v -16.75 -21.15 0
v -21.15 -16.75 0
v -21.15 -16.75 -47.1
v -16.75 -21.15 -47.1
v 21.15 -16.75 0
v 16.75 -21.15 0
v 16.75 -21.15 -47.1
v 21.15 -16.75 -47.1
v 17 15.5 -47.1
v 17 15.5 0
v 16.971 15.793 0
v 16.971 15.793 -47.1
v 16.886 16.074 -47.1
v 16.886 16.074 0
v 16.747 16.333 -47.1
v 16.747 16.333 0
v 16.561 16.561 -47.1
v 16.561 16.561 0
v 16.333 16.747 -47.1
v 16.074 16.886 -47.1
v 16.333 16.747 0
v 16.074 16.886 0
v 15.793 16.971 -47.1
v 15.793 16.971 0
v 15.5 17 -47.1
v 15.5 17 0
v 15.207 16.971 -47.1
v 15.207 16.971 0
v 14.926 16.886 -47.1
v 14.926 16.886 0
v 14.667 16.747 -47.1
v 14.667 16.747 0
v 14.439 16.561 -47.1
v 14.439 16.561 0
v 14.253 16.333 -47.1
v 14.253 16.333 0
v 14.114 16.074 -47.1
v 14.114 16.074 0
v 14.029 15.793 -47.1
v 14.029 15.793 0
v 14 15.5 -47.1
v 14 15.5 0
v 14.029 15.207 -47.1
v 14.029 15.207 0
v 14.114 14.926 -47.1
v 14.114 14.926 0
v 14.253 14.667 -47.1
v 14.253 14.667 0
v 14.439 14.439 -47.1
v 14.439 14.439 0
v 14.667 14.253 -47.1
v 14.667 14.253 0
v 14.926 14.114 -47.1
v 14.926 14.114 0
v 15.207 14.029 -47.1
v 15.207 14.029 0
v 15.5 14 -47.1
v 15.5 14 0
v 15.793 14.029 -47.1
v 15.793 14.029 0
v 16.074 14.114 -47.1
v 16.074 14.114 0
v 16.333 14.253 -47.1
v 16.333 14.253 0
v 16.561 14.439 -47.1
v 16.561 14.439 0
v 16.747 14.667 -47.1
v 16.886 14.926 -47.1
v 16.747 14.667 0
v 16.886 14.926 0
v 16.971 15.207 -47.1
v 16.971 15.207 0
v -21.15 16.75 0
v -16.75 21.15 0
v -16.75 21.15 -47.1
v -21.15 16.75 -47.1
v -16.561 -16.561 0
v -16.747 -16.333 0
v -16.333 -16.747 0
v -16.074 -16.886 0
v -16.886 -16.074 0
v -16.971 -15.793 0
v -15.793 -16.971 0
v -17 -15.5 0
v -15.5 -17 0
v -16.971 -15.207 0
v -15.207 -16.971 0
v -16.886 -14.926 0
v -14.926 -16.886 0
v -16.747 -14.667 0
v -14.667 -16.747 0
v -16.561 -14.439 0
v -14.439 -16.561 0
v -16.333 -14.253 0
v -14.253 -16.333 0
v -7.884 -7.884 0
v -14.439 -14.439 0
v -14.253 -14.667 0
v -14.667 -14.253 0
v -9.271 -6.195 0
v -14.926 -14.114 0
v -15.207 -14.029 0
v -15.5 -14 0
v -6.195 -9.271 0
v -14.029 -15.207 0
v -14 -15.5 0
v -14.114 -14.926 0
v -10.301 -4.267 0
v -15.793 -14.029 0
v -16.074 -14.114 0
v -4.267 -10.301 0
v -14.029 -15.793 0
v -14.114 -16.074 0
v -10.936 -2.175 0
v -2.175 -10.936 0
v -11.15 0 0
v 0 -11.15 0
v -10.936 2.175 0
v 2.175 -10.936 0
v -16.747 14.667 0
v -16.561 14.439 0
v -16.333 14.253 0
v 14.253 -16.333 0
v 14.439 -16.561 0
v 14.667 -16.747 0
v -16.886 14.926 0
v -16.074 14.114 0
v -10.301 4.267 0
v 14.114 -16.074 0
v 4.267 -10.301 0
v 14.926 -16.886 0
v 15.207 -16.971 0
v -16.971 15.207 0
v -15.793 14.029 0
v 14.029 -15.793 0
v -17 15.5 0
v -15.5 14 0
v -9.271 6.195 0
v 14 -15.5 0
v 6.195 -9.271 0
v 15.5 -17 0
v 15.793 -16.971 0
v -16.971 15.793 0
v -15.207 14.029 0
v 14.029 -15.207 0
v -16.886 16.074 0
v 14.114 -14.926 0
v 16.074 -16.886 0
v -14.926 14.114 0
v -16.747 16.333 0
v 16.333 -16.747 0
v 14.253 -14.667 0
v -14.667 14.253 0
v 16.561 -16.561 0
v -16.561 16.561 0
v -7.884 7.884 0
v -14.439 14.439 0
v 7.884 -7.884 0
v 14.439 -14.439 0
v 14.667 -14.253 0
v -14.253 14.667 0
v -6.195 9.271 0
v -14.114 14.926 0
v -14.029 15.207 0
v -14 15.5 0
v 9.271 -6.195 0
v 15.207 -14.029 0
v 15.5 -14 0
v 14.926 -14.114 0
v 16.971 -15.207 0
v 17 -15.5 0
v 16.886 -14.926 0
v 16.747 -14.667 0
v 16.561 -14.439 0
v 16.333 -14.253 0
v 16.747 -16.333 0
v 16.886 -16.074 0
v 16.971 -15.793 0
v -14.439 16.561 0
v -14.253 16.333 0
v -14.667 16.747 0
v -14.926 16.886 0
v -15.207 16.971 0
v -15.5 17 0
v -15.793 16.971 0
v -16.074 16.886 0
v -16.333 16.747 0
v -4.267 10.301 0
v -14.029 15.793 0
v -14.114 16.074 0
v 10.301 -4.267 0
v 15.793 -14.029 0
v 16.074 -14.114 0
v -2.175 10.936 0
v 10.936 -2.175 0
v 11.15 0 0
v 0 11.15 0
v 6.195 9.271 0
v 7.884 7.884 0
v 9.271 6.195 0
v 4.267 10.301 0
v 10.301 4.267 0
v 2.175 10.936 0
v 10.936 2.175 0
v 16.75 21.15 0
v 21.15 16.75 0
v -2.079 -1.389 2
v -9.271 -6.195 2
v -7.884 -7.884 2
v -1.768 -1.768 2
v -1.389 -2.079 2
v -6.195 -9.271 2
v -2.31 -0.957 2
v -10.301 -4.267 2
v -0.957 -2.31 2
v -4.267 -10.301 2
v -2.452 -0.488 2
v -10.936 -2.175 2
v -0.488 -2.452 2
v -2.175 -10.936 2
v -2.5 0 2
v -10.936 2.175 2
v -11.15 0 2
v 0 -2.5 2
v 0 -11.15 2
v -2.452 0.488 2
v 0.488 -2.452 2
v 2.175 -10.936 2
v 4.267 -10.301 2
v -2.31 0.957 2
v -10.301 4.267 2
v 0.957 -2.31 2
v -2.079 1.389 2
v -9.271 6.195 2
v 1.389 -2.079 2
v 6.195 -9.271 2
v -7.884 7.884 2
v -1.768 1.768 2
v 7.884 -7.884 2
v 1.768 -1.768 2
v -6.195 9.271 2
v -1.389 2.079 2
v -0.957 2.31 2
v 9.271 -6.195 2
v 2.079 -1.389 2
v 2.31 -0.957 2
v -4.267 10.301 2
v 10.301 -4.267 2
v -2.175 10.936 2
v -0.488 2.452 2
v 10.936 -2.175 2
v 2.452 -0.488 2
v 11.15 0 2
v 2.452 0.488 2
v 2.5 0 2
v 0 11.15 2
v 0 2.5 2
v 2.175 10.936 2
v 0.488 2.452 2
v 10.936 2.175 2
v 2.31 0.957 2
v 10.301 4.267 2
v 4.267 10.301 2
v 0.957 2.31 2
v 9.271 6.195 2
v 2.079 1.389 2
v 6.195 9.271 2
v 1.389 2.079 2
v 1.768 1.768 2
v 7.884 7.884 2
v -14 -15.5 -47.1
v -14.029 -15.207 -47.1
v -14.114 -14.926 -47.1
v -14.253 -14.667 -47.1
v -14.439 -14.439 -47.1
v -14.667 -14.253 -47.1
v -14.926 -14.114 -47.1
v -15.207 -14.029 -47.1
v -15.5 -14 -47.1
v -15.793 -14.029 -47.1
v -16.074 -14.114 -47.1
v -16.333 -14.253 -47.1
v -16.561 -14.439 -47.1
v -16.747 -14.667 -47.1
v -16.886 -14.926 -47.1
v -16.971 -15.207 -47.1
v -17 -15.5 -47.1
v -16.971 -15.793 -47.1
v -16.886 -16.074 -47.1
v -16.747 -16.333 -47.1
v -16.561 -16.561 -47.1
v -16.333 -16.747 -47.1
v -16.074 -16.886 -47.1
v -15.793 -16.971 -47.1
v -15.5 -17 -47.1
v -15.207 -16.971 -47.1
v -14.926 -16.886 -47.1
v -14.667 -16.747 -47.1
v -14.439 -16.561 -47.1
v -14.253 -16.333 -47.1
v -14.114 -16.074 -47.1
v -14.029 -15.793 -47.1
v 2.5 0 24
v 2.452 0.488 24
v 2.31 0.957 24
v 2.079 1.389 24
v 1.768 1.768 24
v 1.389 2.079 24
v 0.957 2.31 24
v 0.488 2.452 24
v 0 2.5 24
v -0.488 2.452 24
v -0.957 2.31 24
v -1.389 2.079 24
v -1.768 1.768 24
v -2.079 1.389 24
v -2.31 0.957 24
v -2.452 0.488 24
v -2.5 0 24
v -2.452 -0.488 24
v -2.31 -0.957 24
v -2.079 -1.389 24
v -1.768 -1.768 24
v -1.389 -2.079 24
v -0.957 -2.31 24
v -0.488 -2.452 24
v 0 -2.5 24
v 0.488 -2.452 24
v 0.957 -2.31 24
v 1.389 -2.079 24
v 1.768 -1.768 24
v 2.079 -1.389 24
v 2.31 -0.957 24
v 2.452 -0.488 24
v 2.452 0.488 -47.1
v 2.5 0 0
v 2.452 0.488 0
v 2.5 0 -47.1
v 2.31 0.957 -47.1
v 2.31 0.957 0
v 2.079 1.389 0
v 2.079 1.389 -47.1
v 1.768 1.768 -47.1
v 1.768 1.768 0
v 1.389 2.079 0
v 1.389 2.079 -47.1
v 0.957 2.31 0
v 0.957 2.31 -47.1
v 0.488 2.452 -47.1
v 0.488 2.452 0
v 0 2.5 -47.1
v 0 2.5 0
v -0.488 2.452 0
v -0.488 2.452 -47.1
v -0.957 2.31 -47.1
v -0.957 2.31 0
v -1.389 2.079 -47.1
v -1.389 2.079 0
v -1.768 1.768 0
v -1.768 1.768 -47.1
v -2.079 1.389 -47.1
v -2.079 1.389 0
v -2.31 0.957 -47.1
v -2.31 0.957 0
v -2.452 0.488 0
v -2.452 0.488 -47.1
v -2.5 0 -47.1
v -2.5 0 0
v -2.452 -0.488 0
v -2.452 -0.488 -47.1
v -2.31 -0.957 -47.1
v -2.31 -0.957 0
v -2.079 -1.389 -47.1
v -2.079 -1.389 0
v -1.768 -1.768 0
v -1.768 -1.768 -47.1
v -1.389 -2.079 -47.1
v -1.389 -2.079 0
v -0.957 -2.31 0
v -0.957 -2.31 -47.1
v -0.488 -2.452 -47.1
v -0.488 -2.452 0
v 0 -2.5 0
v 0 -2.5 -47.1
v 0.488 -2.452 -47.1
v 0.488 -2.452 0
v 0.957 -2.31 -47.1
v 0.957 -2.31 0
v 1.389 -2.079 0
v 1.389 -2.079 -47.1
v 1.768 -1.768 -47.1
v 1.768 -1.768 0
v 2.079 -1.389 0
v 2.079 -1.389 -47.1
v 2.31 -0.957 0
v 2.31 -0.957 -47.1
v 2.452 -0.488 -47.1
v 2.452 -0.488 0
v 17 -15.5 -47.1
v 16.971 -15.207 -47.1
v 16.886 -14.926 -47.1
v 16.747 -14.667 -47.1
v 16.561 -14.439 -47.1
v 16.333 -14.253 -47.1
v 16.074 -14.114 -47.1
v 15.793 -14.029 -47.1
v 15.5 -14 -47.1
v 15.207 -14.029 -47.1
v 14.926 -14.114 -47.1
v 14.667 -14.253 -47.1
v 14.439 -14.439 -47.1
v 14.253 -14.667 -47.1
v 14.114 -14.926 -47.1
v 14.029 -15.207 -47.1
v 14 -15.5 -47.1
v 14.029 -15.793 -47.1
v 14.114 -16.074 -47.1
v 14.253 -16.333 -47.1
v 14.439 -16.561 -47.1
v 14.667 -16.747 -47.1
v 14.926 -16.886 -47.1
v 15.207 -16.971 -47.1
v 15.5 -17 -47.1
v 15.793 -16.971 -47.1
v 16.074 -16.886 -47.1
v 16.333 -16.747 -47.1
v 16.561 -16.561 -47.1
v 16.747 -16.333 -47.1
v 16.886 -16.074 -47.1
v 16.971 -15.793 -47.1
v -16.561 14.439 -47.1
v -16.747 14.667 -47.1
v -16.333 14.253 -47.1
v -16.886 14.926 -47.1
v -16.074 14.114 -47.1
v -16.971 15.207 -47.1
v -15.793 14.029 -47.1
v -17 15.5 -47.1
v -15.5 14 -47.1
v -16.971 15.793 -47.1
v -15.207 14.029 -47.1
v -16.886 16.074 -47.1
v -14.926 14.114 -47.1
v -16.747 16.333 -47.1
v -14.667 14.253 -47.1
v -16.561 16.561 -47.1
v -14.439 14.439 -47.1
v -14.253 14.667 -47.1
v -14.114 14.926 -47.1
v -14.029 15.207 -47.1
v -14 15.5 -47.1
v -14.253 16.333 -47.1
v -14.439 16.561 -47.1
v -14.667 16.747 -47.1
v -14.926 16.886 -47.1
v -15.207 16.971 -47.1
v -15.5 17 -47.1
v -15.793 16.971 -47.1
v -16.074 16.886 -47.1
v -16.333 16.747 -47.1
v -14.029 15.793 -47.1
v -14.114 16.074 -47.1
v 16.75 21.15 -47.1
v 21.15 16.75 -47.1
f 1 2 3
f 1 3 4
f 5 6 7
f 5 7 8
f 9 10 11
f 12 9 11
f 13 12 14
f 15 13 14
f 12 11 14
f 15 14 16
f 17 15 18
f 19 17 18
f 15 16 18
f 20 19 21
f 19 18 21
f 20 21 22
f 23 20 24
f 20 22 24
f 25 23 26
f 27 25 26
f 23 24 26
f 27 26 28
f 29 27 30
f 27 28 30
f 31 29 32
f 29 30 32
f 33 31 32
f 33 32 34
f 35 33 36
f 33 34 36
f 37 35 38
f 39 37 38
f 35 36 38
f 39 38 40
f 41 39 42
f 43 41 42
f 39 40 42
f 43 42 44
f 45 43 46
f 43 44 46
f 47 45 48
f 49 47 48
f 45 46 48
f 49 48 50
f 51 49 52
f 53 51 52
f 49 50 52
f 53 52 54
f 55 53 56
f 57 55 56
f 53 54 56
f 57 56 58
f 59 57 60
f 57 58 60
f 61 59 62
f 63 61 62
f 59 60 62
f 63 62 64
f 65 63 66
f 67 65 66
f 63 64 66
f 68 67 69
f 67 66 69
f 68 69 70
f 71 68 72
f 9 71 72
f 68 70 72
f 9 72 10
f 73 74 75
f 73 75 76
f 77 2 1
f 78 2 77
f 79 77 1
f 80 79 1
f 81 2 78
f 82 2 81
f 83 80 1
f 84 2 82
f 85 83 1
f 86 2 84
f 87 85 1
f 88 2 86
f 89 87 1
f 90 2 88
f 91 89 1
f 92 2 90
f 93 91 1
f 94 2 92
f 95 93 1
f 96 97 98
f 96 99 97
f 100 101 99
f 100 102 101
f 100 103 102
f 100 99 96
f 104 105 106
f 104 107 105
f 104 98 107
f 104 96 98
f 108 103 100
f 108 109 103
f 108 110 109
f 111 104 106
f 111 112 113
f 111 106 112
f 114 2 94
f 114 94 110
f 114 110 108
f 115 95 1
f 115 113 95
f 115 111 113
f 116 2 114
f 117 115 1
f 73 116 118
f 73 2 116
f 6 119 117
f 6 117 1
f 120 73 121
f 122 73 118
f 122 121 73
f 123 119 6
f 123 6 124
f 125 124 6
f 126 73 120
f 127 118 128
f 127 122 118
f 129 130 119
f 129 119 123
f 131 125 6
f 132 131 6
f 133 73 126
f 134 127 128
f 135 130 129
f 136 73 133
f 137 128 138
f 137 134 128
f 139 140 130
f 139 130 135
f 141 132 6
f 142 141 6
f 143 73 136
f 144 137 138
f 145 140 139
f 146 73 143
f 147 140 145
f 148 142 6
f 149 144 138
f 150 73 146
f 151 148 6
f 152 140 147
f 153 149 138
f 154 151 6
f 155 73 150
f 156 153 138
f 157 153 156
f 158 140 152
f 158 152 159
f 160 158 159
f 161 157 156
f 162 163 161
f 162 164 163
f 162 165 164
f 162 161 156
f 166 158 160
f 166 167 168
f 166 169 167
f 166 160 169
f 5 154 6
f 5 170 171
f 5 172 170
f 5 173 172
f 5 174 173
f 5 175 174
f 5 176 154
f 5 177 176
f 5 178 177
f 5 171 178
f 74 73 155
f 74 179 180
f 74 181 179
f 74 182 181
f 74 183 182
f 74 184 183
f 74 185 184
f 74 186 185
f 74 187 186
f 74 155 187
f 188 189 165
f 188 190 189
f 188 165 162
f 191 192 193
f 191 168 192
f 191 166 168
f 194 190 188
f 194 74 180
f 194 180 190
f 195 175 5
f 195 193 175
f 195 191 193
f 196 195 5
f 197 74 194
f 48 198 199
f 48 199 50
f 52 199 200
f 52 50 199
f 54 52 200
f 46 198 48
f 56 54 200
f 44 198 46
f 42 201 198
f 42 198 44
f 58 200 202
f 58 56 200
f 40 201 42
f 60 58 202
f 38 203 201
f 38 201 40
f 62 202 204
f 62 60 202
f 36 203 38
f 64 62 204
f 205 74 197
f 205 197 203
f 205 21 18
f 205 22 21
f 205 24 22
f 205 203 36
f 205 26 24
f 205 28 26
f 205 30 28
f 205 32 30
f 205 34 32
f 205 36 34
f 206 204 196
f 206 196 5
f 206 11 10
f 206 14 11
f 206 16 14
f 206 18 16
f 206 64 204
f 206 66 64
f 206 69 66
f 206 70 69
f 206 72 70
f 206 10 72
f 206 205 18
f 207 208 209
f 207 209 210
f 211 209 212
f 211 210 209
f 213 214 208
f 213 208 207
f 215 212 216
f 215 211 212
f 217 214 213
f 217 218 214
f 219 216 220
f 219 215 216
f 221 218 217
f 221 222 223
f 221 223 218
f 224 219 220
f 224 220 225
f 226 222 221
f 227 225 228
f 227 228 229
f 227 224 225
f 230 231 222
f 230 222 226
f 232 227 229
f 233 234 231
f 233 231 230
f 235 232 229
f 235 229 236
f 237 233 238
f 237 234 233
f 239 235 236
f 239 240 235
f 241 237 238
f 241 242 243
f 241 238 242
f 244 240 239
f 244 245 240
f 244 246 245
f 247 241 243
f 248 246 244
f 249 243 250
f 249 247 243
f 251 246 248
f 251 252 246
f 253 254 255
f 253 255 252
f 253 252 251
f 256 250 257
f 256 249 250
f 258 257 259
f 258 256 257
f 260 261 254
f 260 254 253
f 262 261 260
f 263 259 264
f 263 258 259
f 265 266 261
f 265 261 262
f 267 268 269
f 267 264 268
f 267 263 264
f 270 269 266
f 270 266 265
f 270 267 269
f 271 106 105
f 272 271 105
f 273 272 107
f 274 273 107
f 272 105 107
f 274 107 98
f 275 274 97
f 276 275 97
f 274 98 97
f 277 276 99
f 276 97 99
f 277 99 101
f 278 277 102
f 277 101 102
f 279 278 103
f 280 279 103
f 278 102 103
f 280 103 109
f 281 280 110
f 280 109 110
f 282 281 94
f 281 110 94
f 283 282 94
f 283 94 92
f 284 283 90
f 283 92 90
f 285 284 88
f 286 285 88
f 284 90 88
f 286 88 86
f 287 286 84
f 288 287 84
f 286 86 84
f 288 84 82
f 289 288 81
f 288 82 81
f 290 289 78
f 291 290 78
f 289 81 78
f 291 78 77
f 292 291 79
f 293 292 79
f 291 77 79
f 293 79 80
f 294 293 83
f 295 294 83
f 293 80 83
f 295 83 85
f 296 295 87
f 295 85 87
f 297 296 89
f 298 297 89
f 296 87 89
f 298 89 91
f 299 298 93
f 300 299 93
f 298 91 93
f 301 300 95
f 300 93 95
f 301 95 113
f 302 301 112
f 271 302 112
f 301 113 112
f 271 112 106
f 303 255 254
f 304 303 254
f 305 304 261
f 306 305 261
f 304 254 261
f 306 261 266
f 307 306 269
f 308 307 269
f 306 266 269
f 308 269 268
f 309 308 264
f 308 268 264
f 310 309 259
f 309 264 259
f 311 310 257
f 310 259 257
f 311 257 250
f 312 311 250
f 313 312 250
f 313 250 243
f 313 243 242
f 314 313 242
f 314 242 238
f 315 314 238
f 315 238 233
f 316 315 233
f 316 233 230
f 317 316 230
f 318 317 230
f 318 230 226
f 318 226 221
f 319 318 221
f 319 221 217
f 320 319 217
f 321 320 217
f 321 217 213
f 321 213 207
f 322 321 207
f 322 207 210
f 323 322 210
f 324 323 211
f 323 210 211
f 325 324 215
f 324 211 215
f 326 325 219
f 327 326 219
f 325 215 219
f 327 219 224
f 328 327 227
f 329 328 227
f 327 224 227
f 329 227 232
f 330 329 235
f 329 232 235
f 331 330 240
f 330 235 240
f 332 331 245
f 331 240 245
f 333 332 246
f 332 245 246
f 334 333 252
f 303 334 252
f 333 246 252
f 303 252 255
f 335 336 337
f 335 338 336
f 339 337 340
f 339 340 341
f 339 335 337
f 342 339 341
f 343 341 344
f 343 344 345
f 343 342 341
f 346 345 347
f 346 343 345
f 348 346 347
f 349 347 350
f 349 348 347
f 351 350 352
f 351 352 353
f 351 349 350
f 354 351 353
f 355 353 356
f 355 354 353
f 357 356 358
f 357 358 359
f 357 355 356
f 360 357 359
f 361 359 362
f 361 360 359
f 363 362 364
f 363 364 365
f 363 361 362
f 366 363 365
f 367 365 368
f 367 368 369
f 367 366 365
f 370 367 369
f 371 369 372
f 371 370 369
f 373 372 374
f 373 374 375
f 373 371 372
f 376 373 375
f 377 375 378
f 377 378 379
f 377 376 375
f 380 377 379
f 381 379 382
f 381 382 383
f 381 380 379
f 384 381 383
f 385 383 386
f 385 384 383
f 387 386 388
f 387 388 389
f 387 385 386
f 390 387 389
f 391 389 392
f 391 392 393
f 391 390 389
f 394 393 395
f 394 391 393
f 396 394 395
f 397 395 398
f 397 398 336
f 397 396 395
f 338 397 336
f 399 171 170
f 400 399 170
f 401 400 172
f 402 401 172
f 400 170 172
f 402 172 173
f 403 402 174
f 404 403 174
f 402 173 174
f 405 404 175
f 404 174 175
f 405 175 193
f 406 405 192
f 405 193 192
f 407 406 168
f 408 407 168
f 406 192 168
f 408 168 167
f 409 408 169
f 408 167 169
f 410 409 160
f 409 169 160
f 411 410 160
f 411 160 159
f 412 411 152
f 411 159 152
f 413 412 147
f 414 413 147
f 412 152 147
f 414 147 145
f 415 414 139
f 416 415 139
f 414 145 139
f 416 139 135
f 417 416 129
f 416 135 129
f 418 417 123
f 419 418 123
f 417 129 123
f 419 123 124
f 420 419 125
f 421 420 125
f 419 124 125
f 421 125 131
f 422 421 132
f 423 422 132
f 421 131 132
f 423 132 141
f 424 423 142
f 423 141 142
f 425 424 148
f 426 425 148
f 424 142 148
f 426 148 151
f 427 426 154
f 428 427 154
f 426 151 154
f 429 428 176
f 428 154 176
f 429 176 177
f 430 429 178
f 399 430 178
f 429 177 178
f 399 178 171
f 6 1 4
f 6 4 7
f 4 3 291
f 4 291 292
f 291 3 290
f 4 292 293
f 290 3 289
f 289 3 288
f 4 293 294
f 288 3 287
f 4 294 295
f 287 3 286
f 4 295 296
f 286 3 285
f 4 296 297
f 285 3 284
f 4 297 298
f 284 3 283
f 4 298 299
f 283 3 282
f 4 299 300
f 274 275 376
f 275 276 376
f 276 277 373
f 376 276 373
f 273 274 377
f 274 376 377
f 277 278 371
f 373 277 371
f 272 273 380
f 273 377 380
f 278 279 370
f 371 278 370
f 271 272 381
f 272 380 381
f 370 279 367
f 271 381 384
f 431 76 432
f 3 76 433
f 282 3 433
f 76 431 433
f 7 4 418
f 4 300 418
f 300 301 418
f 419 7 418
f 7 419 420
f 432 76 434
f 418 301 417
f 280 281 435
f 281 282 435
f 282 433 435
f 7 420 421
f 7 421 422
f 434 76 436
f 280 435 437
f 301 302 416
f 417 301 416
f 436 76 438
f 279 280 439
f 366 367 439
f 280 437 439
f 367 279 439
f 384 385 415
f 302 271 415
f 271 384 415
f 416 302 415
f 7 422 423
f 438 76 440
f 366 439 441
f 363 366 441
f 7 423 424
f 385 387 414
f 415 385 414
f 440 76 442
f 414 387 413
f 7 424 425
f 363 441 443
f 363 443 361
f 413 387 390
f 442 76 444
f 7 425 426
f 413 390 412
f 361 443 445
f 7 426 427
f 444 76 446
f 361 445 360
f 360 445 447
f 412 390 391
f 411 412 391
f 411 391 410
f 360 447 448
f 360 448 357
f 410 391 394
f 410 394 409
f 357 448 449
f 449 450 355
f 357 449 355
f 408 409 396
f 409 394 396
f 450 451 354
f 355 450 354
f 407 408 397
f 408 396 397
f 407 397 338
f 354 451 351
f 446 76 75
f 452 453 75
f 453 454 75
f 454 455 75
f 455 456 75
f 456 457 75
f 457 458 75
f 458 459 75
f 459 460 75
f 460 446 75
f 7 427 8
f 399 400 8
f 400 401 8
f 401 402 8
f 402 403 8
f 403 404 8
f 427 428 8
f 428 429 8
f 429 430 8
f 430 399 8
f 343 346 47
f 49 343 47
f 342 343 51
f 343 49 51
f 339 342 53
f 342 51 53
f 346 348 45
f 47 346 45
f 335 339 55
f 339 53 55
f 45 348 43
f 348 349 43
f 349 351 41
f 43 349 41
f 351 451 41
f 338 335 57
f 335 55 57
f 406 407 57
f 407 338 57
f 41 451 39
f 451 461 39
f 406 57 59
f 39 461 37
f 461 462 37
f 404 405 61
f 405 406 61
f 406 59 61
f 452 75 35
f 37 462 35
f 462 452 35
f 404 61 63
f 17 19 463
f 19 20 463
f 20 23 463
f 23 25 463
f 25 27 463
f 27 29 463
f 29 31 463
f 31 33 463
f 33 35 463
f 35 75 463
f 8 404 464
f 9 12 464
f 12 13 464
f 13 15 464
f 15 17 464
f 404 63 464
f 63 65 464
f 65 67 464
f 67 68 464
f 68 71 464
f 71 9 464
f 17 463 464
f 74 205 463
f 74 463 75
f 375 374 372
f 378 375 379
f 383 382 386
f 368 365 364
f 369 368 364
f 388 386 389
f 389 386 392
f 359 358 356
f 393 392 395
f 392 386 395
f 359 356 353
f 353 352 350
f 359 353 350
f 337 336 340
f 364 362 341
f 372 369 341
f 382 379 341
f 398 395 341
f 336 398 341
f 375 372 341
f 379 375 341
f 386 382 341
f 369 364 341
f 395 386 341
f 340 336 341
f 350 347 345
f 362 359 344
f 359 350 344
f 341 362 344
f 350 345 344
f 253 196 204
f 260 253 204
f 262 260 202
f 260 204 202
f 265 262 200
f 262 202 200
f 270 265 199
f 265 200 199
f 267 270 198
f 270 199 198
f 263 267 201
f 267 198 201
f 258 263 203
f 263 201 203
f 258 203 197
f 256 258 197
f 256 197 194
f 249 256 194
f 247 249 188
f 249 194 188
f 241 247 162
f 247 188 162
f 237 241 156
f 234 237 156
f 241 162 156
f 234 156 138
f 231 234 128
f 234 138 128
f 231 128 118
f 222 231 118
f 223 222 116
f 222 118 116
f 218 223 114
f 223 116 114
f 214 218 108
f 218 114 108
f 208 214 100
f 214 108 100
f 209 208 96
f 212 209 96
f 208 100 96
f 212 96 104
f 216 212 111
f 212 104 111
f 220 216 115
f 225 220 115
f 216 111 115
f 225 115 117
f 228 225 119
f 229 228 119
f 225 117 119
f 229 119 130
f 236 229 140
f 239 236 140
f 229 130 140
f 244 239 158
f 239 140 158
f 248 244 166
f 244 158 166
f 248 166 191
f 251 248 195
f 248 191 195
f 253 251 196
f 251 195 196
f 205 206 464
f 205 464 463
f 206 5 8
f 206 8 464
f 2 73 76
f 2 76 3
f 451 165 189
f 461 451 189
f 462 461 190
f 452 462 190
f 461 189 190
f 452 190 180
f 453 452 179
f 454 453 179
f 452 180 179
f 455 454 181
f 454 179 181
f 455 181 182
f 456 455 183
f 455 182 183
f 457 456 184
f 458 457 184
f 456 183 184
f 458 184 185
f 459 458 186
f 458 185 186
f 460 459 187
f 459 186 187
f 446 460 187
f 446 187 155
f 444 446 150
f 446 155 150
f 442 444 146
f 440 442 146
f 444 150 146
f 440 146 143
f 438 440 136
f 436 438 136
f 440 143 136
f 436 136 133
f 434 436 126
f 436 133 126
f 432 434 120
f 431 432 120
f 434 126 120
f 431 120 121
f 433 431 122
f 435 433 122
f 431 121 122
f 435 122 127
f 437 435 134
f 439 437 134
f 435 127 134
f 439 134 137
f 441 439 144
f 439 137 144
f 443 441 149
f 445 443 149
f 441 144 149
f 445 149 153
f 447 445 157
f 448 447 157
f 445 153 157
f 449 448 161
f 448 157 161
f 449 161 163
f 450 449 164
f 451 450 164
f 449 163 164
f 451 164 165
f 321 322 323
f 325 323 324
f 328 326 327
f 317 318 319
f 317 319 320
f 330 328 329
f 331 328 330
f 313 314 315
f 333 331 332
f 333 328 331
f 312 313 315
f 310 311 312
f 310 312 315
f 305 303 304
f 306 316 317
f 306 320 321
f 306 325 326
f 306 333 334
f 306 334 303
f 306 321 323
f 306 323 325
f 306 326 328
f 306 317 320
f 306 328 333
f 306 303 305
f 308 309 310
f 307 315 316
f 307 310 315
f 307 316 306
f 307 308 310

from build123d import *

# Parameters (mm, degrees)
F0_R     = 1.5
F0_R_2   = 11.15
F0_R_3   = 2.5
F1_DEPTH = 47.1
F2_DEPTH = 2
F3_DEPTH = 24


with BuildPart() as f1:
    # F0 (on Top) → F1 (new body)
    with BuildSketch(Plane.XY):
        Polygon((-16.75, 21.15), (-21.15, 16.75), (-21.15, -16.75), (-16.75, -21.15), (16.75, -21.15), (21.15, -16.75), (21.15, 16.75), (16.75, 21.15), align=None)
        with Locations((-15.5, -15.5)):
            Circle(F0_R, mode=Mode.SUBTRACT)
        with Locations((15.5, -15.5)):
            Circle(F0_R, mode=Mode.SUBTRACT)
        with Locations((-15.5, 15.5)):
            Circle(F0_R, mode=Mode.SUBTRACT)
        Circle(F0_R_2, mode=Mode.SUBTRACT)
        with Locations((15.5, 15.5)):
            Circle(F0_R, mode=Mode.SUBTRACT)
        Circle(F0_R_2)
        Circle(F0_R_3, mode=Mode.SUBTRACT)
    extrude(amount=-F1_DEPTH)

    # F0 (on Top) → F2 (join)
    with BuildSketch(Plane.XY):
        Circle(F0_R_2)
        Circle(F0_R_3, mode=Mode.SUBTRACT)
    extrude(amount=F2_DEPTH)

    # F0 (on Top) → F3 (join)
    with BuildSketch(Plane.XY):
        Circle(F0_R_3)
    extrude(amount=F3_DEPTH)


solid = f1.part
